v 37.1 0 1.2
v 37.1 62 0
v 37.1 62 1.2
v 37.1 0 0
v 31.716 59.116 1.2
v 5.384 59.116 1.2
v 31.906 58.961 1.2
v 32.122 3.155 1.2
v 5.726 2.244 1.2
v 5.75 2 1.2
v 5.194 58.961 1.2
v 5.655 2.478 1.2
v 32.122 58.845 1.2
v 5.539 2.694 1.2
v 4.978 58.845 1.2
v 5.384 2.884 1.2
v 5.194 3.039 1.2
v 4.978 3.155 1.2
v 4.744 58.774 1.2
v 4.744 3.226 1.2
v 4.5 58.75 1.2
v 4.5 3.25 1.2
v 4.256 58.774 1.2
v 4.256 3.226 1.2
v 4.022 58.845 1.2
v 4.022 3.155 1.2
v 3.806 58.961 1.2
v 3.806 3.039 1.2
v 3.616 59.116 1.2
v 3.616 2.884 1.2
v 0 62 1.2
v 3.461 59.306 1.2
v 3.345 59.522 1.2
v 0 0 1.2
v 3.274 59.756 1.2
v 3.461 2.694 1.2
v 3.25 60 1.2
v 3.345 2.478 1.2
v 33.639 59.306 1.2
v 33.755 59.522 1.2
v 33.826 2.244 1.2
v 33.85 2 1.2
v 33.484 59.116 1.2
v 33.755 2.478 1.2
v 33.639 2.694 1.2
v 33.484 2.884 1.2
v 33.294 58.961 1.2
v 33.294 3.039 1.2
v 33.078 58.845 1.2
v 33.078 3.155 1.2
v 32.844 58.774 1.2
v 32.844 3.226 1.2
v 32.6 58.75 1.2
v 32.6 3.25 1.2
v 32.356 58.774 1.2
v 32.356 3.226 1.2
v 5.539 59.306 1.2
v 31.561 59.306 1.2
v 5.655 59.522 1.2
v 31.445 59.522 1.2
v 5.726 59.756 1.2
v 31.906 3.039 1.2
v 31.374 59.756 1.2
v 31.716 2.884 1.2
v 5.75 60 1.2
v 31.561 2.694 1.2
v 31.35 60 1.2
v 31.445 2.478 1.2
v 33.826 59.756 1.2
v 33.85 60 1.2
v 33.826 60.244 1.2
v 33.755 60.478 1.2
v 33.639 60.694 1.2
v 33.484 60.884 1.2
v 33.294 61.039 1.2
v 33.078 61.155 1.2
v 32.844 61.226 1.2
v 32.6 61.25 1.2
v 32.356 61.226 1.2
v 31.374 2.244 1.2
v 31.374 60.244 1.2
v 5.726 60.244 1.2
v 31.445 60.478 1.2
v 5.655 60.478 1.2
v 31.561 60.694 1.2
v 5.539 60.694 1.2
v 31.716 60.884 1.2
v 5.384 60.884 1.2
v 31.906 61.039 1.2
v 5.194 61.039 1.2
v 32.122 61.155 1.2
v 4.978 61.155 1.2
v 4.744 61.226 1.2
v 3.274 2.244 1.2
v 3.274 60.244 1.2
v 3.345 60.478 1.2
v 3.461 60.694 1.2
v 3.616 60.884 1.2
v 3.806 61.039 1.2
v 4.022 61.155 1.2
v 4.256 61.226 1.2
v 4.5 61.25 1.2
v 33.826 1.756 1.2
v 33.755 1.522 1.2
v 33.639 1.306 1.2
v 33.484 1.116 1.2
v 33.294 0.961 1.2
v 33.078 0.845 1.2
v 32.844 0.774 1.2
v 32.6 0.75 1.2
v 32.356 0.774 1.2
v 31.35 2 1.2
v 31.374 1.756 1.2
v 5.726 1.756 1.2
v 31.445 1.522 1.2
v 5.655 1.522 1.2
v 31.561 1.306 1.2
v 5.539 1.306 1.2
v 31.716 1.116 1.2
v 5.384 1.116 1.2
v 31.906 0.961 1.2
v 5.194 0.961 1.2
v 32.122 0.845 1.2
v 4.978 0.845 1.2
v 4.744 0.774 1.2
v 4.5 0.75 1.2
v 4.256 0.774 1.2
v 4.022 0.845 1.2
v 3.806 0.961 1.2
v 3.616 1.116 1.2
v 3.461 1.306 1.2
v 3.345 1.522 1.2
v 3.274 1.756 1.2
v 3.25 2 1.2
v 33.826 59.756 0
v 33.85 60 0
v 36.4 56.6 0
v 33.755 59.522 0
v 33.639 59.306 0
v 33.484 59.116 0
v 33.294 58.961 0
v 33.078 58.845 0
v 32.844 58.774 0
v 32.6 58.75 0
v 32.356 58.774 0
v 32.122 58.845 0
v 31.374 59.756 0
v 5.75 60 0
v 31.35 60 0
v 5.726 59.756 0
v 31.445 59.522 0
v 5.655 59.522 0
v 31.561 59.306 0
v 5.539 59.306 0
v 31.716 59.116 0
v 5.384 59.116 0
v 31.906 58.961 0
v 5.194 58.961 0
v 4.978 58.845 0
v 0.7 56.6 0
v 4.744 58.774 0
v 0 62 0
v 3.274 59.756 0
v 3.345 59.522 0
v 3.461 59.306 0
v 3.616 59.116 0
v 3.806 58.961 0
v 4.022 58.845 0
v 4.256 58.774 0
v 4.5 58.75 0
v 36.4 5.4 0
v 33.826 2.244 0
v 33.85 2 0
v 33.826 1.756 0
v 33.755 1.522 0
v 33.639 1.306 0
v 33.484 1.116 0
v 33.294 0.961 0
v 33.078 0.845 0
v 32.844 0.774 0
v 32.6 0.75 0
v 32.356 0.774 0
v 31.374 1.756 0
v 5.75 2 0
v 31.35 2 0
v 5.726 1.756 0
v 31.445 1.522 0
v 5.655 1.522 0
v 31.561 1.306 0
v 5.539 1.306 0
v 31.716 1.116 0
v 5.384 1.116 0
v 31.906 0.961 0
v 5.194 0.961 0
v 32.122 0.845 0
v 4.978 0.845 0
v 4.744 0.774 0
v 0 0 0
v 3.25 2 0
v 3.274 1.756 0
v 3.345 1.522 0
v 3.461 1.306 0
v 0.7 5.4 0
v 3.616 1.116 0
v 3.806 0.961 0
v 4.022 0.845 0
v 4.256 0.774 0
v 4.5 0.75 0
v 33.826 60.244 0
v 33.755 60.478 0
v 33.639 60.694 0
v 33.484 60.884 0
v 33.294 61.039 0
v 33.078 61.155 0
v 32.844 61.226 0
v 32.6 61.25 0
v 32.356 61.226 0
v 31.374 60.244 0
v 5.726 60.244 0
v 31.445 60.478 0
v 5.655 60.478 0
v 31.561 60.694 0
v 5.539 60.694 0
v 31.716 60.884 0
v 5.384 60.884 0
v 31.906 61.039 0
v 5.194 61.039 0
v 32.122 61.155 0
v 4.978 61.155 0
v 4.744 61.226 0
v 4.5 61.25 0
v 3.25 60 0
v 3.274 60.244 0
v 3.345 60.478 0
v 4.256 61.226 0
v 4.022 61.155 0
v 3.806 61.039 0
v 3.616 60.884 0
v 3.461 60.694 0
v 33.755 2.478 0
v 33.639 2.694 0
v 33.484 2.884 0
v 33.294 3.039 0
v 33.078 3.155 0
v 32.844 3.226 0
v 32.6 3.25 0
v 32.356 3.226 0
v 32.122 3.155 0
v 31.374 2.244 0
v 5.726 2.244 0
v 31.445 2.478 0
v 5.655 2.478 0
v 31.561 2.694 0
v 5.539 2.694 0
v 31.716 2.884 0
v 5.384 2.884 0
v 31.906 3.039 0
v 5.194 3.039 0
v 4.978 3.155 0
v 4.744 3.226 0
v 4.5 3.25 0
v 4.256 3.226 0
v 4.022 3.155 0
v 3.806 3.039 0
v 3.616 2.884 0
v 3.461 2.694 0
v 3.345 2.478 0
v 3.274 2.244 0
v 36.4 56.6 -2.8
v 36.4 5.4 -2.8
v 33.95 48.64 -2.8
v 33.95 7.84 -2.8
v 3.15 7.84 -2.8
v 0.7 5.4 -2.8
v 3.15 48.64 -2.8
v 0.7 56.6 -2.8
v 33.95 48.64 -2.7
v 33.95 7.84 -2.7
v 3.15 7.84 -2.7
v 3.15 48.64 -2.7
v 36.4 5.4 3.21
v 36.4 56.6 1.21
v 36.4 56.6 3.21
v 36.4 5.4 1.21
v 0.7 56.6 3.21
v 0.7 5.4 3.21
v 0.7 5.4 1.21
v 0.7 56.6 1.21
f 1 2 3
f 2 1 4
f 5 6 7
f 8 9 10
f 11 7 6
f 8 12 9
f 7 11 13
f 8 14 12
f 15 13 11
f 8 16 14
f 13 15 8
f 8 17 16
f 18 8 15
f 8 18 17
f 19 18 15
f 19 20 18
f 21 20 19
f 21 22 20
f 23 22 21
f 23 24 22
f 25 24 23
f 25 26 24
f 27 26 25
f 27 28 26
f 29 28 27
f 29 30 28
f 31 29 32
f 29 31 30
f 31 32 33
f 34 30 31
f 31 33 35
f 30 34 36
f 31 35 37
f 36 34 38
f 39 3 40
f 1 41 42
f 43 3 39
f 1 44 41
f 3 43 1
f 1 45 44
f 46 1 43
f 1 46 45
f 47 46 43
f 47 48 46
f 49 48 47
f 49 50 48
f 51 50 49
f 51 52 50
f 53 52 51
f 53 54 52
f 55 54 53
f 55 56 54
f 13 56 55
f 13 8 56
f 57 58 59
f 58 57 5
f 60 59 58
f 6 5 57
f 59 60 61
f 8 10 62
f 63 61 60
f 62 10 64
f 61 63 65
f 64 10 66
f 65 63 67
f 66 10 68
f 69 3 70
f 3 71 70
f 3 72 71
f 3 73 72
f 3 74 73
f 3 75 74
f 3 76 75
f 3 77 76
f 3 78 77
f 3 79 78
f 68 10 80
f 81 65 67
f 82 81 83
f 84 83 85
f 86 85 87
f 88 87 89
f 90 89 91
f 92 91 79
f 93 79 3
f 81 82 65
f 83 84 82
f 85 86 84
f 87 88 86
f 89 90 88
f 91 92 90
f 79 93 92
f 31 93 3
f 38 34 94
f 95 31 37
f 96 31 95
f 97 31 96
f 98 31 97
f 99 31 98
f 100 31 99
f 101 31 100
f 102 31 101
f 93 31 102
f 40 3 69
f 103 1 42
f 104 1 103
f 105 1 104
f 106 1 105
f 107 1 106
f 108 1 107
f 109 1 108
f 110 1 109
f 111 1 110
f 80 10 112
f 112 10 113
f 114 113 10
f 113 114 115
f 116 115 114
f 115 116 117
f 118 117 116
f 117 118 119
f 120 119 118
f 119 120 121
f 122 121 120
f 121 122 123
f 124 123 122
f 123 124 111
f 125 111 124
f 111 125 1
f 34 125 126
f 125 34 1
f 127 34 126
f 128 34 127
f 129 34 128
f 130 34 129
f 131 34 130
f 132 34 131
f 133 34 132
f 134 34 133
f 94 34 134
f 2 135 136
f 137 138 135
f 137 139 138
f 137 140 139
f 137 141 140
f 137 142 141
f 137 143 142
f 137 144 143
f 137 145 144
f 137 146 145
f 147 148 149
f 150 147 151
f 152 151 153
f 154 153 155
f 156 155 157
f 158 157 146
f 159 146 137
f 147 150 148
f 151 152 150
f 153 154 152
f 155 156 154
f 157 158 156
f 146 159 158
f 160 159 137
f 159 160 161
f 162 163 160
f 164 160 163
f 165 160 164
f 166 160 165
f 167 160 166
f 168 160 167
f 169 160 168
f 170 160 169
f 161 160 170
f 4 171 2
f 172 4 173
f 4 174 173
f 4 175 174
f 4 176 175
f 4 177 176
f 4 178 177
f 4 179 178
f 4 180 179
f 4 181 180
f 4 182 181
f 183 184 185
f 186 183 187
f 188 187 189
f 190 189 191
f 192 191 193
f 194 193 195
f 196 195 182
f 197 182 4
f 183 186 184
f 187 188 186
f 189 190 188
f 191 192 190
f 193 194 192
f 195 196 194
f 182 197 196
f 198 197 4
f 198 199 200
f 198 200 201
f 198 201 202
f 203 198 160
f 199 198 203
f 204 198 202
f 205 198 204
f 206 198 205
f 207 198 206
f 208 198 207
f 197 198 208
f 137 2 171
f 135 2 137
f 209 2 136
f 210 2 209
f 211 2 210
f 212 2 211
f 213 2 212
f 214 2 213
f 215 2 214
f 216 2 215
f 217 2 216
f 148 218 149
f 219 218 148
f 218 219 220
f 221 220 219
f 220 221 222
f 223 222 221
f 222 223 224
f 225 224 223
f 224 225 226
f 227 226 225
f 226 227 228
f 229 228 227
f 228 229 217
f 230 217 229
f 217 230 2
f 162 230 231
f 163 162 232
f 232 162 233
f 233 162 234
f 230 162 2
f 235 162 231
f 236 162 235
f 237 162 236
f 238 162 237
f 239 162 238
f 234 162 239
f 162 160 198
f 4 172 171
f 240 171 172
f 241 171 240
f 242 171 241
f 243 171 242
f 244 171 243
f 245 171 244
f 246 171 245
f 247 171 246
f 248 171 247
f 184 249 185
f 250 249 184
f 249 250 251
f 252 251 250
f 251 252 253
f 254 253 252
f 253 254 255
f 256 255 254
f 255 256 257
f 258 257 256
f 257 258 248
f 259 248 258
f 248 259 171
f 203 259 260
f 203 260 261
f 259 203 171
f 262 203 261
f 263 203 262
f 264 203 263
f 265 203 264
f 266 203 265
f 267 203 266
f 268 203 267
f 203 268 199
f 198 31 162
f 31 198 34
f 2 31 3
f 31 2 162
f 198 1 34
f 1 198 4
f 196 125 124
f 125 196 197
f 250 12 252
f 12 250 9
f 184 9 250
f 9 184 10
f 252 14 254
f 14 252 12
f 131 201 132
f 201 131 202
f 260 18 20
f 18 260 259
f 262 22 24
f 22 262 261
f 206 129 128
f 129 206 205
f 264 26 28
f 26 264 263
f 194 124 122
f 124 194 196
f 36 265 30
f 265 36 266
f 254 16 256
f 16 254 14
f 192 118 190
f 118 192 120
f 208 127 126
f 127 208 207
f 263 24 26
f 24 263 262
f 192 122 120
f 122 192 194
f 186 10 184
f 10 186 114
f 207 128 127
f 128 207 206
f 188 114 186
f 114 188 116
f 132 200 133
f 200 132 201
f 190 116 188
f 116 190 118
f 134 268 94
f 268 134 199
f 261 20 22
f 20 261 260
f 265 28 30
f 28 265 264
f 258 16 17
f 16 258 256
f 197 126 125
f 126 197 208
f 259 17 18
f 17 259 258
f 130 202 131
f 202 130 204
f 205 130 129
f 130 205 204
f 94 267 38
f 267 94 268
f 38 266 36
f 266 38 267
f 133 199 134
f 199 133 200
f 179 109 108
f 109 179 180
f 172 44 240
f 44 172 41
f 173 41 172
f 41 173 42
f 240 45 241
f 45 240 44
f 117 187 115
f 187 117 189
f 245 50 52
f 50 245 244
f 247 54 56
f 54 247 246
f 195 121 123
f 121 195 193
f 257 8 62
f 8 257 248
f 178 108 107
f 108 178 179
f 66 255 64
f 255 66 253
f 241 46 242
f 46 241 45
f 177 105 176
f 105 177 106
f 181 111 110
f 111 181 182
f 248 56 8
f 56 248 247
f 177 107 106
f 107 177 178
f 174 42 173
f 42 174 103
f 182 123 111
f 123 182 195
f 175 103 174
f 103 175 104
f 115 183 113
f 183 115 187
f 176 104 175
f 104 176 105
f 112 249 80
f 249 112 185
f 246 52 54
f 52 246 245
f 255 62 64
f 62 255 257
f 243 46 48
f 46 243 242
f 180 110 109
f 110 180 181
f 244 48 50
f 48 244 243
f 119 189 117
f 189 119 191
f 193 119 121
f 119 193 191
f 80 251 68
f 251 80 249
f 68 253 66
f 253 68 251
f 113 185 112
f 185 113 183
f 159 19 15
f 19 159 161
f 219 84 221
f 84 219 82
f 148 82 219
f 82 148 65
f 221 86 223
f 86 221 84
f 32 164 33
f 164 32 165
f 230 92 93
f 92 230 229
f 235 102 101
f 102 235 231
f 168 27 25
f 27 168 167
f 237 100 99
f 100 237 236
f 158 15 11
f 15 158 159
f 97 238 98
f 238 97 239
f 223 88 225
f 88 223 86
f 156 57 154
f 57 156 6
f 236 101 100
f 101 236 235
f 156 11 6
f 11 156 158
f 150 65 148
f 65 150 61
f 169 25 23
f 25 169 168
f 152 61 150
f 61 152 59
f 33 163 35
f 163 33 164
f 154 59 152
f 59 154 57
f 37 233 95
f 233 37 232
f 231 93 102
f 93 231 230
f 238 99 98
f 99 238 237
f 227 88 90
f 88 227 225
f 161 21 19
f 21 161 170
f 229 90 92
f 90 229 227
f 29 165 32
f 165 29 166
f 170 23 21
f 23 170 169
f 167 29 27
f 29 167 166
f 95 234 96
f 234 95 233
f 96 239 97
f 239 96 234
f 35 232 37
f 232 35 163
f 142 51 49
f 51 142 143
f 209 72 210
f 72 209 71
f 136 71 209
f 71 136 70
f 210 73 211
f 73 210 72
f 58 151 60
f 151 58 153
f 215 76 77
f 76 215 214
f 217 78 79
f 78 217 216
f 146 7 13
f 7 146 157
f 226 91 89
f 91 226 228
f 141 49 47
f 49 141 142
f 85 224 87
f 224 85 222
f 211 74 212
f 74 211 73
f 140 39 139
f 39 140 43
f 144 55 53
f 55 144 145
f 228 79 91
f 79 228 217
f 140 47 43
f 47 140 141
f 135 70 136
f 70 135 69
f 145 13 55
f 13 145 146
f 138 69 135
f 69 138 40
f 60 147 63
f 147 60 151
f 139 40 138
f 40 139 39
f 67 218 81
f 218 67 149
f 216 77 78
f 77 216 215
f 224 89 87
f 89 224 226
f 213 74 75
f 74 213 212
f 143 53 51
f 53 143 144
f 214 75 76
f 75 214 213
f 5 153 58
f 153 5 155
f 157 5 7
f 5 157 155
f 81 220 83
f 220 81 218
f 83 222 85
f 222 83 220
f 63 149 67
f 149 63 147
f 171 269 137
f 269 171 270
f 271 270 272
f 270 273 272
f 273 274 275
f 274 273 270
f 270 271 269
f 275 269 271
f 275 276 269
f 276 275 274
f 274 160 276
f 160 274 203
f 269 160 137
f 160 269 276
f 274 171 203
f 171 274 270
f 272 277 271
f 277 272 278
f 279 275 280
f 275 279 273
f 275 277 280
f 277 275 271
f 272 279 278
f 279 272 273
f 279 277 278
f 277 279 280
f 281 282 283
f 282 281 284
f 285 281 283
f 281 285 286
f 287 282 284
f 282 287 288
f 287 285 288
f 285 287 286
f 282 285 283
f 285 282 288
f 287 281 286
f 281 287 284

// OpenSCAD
$fn = 32;

union() {
  difference() {
    color("navy")
      cube([37.1, 62.0, 1.2]);
      
    translate([4.5, 2, 0])
      cylinder(1.2, r = 2.5/2);
      
     translate([37.1-4.5, 2, 0])
      cylinder(1.2, r = 2.5/2);
      
    translate([4.5, 60, 0])
      cylinder(1.2, r = 2.5/2);
      
    translate([37.1-4.5, 60, 0])
      cylinder(1.2, r = 2.5/2);
  }
  
  difference() {
    translate([(37.1-35.7)/2,5.4,-4+1.2])
      color("white")
        cube([35.7,51.2,4-1.2]);
          
      translate([(37.1-30.8)/2, 2.44+5.4, -4+1.2])
        cube([30.8,40.8,1]);
   }
  
   color("grey") 
     translate([(37.1-30.8)/2, 2.44+5.4, -3.9+1.2])
        cube([30.8,40.8,.9]);
        
    color("black", 0.25)
       translate([(37.1-35.7)/2,5.4, 1.21])
        cube([35.7, 51.2, 2]);
}
